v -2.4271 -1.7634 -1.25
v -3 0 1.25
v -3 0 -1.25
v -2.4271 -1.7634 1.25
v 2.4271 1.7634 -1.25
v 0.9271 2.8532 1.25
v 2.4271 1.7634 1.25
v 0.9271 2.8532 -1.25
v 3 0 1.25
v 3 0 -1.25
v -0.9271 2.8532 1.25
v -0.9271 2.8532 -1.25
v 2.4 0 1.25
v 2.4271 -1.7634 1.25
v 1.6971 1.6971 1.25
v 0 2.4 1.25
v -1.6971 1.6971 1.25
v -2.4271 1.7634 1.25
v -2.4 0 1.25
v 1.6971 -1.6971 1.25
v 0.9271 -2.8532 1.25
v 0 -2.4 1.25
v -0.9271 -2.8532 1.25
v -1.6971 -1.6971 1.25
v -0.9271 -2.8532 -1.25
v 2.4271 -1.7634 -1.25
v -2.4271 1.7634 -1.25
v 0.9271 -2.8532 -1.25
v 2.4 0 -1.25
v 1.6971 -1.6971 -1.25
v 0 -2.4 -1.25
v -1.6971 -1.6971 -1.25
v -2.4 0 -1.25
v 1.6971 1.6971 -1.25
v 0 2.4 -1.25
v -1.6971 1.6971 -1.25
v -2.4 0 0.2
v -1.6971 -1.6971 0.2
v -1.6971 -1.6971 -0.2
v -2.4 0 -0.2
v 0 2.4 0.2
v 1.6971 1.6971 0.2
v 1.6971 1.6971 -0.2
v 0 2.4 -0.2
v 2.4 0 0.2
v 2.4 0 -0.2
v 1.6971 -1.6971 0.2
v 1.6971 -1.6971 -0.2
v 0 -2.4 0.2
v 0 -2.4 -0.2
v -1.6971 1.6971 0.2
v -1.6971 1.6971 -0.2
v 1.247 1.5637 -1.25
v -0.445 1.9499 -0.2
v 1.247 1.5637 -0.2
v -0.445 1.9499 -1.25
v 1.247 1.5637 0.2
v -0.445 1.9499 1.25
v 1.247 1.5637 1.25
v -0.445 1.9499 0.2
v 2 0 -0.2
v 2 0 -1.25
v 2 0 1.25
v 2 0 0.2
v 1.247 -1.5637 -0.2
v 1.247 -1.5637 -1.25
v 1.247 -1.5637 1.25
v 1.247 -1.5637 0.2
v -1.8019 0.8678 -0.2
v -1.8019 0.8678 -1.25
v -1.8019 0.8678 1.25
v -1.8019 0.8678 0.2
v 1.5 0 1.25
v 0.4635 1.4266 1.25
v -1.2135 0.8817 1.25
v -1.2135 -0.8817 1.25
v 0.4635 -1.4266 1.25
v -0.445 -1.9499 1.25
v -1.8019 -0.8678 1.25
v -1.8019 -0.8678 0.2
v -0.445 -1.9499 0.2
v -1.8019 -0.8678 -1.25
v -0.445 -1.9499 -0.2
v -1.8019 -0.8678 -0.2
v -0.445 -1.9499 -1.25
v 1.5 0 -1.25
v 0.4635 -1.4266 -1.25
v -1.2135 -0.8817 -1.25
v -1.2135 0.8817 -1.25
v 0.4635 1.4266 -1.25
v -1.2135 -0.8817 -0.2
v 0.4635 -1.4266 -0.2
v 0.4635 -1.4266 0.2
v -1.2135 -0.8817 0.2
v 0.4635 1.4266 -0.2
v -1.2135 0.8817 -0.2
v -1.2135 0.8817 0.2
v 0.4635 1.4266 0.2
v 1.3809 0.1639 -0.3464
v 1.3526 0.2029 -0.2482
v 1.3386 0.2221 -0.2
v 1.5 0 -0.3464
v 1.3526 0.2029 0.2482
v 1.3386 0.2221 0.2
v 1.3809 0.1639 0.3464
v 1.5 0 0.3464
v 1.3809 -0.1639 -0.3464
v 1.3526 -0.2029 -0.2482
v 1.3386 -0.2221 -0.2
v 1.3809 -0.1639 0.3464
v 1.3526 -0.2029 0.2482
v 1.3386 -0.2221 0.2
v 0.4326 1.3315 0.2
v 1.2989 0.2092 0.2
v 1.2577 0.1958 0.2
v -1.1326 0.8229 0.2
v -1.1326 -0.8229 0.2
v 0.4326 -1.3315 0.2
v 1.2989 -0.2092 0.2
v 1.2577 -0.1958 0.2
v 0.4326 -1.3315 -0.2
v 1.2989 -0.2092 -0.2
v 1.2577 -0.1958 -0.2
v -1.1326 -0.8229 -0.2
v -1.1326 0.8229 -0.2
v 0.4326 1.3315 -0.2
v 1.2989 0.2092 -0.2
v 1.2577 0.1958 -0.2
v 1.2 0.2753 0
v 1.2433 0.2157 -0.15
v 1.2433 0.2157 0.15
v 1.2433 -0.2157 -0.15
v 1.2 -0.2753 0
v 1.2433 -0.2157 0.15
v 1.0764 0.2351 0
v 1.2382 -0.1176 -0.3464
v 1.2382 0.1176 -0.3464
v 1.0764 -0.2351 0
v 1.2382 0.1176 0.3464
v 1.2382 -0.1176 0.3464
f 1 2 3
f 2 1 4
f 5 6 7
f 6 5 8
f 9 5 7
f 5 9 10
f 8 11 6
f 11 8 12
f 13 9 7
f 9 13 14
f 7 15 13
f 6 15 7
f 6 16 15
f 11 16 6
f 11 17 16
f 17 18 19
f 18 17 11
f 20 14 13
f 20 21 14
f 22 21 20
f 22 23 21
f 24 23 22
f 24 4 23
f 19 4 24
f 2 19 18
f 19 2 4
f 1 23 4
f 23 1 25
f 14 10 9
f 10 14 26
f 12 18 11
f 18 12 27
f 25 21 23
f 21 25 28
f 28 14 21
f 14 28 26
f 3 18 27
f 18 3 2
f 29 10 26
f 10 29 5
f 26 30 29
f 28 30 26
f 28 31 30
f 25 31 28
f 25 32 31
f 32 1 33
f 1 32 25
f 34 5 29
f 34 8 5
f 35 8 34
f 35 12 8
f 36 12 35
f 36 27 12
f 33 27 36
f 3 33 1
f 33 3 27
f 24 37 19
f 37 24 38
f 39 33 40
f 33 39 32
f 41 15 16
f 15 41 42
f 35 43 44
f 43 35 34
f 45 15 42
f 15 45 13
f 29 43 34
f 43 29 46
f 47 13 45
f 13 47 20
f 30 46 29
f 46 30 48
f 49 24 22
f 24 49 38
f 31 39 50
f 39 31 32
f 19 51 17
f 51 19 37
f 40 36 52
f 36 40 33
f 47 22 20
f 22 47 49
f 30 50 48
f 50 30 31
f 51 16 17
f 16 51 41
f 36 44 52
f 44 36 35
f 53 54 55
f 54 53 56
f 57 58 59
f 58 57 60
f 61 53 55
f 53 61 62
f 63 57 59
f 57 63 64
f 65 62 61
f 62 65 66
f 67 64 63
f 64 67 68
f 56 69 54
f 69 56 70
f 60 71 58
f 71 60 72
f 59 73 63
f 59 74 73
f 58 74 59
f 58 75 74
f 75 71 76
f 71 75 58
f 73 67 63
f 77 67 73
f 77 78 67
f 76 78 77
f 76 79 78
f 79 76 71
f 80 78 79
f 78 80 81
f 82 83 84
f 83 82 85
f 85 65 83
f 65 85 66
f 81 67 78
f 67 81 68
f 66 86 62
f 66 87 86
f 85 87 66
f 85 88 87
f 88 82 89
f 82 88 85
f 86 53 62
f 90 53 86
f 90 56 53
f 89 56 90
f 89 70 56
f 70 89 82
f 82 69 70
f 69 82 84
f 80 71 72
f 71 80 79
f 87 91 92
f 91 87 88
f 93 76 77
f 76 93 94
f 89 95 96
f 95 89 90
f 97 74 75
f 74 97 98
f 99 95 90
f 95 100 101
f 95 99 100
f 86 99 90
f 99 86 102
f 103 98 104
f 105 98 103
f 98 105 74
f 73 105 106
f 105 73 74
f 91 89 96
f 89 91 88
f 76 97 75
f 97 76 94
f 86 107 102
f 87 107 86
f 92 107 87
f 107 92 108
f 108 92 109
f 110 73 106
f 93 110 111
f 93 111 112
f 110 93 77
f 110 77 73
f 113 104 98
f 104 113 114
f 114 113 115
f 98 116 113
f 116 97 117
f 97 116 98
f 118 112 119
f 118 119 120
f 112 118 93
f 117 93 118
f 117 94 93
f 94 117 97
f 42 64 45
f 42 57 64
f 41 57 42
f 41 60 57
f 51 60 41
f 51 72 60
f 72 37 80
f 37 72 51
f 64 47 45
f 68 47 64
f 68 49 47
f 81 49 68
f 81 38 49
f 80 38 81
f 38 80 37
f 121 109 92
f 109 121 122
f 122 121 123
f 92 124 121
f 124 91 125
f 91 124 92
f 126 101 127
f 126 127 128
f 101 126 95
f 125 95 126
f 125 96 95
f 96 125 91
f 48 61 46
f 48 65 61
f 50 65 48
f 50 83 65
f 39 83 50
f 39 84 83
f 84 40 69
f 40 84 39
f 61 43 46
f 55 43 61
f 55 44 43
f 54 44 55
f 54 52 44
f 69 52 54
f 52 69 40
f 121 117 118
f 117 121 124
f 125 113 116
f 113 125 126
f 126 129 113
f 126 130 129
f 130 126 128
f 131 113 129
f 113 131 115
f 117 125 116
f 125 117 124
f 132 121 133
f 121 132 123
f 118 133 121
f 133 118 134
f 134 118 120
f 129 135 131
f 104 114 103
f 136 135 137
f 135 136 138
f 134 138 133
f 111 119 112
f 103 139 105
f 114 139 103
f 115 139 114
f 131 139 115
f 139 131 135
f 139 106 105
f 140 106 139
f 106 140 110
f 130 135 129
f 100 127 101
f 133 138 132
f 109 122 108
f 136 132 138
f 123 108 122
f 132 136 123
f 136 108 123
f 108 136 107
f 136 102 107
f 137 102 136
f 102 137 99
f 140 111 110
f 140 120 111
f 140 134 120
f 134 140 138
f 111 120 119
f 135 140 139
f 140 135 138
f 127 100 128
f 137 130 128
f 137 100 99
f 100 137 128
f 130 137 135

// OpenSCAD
// Parameters
bore_diameter_mm = 3.0; //[1.5:6.0:0.1]
outer_diameter_mm = 6.0; //[3.0:12.0:0.1]
width_mm = 2.5; //[1.25:5.0:0.1]
bore_radius_mm = 1.5; //[0.75:3.0:0.05]
outer_radius_mm = 3.0; //[1.5:6.0:0.05]
eps_mm = 0.6; //[0.2:1.5:0.1]
rim_radial_thickness_mm = 0.6; //[0.3:1.2:0.05]
hub_radial_thickness_mm = 0.5; //[0.25:1.0:0.05]
shield_thickness_mm = 0.4; //[0.2:0.8:0.05]
ball_diameter_mm = 0.8; //[0.4:1.6:0.05]

// Ball Bearing - complete geometry
module ball_bearing() {
  color("Silver") {
    // Outer Ring
    difference() {
      cylinder(r=outer_diameter_mm/2, h=width_mm, center=true);
      cylinder(r=outer_diameter_mm/2 - rim_radial_thickness_mm, h=width_mm + 2*eps_mm, center=true);
    }
    // Inner Ring
    difference() {
      cylinder(r=bore_diameter_mm/2 + hub_radial_thickness_mm, h=width_mm, center=true);
      cylinder(r=bore_diameter_mm/2, h=width_mm + 2*eps_mm, center=true);
    }
    // Shield or Seal
    difference() {
      cylinder(r=outer_diameter_mm/2 - rim_radial_thickness_mm + eps_mm, h=shield_thickness_mm, center=true);
      cylinder(r=bore_diameter_mm/2 + hub_radial_thickness_mm - eps_mm, h=shield_thickness_mm + 2*eps_mm, center=true);
    }
  }
}

// Bearing Ball - complete geometry
module bearing_ball() {
  color("Copper") {
    translate([bore_diameter_mm/2 + hub_radial_thickness_mm - eps_mm, 0, 0])
      sphere(r=ball_diameter_mm/2);
  }
}

// Assembly
module assembly() {
  ball_bearing();
  bearing_ball();
}

assembly();
